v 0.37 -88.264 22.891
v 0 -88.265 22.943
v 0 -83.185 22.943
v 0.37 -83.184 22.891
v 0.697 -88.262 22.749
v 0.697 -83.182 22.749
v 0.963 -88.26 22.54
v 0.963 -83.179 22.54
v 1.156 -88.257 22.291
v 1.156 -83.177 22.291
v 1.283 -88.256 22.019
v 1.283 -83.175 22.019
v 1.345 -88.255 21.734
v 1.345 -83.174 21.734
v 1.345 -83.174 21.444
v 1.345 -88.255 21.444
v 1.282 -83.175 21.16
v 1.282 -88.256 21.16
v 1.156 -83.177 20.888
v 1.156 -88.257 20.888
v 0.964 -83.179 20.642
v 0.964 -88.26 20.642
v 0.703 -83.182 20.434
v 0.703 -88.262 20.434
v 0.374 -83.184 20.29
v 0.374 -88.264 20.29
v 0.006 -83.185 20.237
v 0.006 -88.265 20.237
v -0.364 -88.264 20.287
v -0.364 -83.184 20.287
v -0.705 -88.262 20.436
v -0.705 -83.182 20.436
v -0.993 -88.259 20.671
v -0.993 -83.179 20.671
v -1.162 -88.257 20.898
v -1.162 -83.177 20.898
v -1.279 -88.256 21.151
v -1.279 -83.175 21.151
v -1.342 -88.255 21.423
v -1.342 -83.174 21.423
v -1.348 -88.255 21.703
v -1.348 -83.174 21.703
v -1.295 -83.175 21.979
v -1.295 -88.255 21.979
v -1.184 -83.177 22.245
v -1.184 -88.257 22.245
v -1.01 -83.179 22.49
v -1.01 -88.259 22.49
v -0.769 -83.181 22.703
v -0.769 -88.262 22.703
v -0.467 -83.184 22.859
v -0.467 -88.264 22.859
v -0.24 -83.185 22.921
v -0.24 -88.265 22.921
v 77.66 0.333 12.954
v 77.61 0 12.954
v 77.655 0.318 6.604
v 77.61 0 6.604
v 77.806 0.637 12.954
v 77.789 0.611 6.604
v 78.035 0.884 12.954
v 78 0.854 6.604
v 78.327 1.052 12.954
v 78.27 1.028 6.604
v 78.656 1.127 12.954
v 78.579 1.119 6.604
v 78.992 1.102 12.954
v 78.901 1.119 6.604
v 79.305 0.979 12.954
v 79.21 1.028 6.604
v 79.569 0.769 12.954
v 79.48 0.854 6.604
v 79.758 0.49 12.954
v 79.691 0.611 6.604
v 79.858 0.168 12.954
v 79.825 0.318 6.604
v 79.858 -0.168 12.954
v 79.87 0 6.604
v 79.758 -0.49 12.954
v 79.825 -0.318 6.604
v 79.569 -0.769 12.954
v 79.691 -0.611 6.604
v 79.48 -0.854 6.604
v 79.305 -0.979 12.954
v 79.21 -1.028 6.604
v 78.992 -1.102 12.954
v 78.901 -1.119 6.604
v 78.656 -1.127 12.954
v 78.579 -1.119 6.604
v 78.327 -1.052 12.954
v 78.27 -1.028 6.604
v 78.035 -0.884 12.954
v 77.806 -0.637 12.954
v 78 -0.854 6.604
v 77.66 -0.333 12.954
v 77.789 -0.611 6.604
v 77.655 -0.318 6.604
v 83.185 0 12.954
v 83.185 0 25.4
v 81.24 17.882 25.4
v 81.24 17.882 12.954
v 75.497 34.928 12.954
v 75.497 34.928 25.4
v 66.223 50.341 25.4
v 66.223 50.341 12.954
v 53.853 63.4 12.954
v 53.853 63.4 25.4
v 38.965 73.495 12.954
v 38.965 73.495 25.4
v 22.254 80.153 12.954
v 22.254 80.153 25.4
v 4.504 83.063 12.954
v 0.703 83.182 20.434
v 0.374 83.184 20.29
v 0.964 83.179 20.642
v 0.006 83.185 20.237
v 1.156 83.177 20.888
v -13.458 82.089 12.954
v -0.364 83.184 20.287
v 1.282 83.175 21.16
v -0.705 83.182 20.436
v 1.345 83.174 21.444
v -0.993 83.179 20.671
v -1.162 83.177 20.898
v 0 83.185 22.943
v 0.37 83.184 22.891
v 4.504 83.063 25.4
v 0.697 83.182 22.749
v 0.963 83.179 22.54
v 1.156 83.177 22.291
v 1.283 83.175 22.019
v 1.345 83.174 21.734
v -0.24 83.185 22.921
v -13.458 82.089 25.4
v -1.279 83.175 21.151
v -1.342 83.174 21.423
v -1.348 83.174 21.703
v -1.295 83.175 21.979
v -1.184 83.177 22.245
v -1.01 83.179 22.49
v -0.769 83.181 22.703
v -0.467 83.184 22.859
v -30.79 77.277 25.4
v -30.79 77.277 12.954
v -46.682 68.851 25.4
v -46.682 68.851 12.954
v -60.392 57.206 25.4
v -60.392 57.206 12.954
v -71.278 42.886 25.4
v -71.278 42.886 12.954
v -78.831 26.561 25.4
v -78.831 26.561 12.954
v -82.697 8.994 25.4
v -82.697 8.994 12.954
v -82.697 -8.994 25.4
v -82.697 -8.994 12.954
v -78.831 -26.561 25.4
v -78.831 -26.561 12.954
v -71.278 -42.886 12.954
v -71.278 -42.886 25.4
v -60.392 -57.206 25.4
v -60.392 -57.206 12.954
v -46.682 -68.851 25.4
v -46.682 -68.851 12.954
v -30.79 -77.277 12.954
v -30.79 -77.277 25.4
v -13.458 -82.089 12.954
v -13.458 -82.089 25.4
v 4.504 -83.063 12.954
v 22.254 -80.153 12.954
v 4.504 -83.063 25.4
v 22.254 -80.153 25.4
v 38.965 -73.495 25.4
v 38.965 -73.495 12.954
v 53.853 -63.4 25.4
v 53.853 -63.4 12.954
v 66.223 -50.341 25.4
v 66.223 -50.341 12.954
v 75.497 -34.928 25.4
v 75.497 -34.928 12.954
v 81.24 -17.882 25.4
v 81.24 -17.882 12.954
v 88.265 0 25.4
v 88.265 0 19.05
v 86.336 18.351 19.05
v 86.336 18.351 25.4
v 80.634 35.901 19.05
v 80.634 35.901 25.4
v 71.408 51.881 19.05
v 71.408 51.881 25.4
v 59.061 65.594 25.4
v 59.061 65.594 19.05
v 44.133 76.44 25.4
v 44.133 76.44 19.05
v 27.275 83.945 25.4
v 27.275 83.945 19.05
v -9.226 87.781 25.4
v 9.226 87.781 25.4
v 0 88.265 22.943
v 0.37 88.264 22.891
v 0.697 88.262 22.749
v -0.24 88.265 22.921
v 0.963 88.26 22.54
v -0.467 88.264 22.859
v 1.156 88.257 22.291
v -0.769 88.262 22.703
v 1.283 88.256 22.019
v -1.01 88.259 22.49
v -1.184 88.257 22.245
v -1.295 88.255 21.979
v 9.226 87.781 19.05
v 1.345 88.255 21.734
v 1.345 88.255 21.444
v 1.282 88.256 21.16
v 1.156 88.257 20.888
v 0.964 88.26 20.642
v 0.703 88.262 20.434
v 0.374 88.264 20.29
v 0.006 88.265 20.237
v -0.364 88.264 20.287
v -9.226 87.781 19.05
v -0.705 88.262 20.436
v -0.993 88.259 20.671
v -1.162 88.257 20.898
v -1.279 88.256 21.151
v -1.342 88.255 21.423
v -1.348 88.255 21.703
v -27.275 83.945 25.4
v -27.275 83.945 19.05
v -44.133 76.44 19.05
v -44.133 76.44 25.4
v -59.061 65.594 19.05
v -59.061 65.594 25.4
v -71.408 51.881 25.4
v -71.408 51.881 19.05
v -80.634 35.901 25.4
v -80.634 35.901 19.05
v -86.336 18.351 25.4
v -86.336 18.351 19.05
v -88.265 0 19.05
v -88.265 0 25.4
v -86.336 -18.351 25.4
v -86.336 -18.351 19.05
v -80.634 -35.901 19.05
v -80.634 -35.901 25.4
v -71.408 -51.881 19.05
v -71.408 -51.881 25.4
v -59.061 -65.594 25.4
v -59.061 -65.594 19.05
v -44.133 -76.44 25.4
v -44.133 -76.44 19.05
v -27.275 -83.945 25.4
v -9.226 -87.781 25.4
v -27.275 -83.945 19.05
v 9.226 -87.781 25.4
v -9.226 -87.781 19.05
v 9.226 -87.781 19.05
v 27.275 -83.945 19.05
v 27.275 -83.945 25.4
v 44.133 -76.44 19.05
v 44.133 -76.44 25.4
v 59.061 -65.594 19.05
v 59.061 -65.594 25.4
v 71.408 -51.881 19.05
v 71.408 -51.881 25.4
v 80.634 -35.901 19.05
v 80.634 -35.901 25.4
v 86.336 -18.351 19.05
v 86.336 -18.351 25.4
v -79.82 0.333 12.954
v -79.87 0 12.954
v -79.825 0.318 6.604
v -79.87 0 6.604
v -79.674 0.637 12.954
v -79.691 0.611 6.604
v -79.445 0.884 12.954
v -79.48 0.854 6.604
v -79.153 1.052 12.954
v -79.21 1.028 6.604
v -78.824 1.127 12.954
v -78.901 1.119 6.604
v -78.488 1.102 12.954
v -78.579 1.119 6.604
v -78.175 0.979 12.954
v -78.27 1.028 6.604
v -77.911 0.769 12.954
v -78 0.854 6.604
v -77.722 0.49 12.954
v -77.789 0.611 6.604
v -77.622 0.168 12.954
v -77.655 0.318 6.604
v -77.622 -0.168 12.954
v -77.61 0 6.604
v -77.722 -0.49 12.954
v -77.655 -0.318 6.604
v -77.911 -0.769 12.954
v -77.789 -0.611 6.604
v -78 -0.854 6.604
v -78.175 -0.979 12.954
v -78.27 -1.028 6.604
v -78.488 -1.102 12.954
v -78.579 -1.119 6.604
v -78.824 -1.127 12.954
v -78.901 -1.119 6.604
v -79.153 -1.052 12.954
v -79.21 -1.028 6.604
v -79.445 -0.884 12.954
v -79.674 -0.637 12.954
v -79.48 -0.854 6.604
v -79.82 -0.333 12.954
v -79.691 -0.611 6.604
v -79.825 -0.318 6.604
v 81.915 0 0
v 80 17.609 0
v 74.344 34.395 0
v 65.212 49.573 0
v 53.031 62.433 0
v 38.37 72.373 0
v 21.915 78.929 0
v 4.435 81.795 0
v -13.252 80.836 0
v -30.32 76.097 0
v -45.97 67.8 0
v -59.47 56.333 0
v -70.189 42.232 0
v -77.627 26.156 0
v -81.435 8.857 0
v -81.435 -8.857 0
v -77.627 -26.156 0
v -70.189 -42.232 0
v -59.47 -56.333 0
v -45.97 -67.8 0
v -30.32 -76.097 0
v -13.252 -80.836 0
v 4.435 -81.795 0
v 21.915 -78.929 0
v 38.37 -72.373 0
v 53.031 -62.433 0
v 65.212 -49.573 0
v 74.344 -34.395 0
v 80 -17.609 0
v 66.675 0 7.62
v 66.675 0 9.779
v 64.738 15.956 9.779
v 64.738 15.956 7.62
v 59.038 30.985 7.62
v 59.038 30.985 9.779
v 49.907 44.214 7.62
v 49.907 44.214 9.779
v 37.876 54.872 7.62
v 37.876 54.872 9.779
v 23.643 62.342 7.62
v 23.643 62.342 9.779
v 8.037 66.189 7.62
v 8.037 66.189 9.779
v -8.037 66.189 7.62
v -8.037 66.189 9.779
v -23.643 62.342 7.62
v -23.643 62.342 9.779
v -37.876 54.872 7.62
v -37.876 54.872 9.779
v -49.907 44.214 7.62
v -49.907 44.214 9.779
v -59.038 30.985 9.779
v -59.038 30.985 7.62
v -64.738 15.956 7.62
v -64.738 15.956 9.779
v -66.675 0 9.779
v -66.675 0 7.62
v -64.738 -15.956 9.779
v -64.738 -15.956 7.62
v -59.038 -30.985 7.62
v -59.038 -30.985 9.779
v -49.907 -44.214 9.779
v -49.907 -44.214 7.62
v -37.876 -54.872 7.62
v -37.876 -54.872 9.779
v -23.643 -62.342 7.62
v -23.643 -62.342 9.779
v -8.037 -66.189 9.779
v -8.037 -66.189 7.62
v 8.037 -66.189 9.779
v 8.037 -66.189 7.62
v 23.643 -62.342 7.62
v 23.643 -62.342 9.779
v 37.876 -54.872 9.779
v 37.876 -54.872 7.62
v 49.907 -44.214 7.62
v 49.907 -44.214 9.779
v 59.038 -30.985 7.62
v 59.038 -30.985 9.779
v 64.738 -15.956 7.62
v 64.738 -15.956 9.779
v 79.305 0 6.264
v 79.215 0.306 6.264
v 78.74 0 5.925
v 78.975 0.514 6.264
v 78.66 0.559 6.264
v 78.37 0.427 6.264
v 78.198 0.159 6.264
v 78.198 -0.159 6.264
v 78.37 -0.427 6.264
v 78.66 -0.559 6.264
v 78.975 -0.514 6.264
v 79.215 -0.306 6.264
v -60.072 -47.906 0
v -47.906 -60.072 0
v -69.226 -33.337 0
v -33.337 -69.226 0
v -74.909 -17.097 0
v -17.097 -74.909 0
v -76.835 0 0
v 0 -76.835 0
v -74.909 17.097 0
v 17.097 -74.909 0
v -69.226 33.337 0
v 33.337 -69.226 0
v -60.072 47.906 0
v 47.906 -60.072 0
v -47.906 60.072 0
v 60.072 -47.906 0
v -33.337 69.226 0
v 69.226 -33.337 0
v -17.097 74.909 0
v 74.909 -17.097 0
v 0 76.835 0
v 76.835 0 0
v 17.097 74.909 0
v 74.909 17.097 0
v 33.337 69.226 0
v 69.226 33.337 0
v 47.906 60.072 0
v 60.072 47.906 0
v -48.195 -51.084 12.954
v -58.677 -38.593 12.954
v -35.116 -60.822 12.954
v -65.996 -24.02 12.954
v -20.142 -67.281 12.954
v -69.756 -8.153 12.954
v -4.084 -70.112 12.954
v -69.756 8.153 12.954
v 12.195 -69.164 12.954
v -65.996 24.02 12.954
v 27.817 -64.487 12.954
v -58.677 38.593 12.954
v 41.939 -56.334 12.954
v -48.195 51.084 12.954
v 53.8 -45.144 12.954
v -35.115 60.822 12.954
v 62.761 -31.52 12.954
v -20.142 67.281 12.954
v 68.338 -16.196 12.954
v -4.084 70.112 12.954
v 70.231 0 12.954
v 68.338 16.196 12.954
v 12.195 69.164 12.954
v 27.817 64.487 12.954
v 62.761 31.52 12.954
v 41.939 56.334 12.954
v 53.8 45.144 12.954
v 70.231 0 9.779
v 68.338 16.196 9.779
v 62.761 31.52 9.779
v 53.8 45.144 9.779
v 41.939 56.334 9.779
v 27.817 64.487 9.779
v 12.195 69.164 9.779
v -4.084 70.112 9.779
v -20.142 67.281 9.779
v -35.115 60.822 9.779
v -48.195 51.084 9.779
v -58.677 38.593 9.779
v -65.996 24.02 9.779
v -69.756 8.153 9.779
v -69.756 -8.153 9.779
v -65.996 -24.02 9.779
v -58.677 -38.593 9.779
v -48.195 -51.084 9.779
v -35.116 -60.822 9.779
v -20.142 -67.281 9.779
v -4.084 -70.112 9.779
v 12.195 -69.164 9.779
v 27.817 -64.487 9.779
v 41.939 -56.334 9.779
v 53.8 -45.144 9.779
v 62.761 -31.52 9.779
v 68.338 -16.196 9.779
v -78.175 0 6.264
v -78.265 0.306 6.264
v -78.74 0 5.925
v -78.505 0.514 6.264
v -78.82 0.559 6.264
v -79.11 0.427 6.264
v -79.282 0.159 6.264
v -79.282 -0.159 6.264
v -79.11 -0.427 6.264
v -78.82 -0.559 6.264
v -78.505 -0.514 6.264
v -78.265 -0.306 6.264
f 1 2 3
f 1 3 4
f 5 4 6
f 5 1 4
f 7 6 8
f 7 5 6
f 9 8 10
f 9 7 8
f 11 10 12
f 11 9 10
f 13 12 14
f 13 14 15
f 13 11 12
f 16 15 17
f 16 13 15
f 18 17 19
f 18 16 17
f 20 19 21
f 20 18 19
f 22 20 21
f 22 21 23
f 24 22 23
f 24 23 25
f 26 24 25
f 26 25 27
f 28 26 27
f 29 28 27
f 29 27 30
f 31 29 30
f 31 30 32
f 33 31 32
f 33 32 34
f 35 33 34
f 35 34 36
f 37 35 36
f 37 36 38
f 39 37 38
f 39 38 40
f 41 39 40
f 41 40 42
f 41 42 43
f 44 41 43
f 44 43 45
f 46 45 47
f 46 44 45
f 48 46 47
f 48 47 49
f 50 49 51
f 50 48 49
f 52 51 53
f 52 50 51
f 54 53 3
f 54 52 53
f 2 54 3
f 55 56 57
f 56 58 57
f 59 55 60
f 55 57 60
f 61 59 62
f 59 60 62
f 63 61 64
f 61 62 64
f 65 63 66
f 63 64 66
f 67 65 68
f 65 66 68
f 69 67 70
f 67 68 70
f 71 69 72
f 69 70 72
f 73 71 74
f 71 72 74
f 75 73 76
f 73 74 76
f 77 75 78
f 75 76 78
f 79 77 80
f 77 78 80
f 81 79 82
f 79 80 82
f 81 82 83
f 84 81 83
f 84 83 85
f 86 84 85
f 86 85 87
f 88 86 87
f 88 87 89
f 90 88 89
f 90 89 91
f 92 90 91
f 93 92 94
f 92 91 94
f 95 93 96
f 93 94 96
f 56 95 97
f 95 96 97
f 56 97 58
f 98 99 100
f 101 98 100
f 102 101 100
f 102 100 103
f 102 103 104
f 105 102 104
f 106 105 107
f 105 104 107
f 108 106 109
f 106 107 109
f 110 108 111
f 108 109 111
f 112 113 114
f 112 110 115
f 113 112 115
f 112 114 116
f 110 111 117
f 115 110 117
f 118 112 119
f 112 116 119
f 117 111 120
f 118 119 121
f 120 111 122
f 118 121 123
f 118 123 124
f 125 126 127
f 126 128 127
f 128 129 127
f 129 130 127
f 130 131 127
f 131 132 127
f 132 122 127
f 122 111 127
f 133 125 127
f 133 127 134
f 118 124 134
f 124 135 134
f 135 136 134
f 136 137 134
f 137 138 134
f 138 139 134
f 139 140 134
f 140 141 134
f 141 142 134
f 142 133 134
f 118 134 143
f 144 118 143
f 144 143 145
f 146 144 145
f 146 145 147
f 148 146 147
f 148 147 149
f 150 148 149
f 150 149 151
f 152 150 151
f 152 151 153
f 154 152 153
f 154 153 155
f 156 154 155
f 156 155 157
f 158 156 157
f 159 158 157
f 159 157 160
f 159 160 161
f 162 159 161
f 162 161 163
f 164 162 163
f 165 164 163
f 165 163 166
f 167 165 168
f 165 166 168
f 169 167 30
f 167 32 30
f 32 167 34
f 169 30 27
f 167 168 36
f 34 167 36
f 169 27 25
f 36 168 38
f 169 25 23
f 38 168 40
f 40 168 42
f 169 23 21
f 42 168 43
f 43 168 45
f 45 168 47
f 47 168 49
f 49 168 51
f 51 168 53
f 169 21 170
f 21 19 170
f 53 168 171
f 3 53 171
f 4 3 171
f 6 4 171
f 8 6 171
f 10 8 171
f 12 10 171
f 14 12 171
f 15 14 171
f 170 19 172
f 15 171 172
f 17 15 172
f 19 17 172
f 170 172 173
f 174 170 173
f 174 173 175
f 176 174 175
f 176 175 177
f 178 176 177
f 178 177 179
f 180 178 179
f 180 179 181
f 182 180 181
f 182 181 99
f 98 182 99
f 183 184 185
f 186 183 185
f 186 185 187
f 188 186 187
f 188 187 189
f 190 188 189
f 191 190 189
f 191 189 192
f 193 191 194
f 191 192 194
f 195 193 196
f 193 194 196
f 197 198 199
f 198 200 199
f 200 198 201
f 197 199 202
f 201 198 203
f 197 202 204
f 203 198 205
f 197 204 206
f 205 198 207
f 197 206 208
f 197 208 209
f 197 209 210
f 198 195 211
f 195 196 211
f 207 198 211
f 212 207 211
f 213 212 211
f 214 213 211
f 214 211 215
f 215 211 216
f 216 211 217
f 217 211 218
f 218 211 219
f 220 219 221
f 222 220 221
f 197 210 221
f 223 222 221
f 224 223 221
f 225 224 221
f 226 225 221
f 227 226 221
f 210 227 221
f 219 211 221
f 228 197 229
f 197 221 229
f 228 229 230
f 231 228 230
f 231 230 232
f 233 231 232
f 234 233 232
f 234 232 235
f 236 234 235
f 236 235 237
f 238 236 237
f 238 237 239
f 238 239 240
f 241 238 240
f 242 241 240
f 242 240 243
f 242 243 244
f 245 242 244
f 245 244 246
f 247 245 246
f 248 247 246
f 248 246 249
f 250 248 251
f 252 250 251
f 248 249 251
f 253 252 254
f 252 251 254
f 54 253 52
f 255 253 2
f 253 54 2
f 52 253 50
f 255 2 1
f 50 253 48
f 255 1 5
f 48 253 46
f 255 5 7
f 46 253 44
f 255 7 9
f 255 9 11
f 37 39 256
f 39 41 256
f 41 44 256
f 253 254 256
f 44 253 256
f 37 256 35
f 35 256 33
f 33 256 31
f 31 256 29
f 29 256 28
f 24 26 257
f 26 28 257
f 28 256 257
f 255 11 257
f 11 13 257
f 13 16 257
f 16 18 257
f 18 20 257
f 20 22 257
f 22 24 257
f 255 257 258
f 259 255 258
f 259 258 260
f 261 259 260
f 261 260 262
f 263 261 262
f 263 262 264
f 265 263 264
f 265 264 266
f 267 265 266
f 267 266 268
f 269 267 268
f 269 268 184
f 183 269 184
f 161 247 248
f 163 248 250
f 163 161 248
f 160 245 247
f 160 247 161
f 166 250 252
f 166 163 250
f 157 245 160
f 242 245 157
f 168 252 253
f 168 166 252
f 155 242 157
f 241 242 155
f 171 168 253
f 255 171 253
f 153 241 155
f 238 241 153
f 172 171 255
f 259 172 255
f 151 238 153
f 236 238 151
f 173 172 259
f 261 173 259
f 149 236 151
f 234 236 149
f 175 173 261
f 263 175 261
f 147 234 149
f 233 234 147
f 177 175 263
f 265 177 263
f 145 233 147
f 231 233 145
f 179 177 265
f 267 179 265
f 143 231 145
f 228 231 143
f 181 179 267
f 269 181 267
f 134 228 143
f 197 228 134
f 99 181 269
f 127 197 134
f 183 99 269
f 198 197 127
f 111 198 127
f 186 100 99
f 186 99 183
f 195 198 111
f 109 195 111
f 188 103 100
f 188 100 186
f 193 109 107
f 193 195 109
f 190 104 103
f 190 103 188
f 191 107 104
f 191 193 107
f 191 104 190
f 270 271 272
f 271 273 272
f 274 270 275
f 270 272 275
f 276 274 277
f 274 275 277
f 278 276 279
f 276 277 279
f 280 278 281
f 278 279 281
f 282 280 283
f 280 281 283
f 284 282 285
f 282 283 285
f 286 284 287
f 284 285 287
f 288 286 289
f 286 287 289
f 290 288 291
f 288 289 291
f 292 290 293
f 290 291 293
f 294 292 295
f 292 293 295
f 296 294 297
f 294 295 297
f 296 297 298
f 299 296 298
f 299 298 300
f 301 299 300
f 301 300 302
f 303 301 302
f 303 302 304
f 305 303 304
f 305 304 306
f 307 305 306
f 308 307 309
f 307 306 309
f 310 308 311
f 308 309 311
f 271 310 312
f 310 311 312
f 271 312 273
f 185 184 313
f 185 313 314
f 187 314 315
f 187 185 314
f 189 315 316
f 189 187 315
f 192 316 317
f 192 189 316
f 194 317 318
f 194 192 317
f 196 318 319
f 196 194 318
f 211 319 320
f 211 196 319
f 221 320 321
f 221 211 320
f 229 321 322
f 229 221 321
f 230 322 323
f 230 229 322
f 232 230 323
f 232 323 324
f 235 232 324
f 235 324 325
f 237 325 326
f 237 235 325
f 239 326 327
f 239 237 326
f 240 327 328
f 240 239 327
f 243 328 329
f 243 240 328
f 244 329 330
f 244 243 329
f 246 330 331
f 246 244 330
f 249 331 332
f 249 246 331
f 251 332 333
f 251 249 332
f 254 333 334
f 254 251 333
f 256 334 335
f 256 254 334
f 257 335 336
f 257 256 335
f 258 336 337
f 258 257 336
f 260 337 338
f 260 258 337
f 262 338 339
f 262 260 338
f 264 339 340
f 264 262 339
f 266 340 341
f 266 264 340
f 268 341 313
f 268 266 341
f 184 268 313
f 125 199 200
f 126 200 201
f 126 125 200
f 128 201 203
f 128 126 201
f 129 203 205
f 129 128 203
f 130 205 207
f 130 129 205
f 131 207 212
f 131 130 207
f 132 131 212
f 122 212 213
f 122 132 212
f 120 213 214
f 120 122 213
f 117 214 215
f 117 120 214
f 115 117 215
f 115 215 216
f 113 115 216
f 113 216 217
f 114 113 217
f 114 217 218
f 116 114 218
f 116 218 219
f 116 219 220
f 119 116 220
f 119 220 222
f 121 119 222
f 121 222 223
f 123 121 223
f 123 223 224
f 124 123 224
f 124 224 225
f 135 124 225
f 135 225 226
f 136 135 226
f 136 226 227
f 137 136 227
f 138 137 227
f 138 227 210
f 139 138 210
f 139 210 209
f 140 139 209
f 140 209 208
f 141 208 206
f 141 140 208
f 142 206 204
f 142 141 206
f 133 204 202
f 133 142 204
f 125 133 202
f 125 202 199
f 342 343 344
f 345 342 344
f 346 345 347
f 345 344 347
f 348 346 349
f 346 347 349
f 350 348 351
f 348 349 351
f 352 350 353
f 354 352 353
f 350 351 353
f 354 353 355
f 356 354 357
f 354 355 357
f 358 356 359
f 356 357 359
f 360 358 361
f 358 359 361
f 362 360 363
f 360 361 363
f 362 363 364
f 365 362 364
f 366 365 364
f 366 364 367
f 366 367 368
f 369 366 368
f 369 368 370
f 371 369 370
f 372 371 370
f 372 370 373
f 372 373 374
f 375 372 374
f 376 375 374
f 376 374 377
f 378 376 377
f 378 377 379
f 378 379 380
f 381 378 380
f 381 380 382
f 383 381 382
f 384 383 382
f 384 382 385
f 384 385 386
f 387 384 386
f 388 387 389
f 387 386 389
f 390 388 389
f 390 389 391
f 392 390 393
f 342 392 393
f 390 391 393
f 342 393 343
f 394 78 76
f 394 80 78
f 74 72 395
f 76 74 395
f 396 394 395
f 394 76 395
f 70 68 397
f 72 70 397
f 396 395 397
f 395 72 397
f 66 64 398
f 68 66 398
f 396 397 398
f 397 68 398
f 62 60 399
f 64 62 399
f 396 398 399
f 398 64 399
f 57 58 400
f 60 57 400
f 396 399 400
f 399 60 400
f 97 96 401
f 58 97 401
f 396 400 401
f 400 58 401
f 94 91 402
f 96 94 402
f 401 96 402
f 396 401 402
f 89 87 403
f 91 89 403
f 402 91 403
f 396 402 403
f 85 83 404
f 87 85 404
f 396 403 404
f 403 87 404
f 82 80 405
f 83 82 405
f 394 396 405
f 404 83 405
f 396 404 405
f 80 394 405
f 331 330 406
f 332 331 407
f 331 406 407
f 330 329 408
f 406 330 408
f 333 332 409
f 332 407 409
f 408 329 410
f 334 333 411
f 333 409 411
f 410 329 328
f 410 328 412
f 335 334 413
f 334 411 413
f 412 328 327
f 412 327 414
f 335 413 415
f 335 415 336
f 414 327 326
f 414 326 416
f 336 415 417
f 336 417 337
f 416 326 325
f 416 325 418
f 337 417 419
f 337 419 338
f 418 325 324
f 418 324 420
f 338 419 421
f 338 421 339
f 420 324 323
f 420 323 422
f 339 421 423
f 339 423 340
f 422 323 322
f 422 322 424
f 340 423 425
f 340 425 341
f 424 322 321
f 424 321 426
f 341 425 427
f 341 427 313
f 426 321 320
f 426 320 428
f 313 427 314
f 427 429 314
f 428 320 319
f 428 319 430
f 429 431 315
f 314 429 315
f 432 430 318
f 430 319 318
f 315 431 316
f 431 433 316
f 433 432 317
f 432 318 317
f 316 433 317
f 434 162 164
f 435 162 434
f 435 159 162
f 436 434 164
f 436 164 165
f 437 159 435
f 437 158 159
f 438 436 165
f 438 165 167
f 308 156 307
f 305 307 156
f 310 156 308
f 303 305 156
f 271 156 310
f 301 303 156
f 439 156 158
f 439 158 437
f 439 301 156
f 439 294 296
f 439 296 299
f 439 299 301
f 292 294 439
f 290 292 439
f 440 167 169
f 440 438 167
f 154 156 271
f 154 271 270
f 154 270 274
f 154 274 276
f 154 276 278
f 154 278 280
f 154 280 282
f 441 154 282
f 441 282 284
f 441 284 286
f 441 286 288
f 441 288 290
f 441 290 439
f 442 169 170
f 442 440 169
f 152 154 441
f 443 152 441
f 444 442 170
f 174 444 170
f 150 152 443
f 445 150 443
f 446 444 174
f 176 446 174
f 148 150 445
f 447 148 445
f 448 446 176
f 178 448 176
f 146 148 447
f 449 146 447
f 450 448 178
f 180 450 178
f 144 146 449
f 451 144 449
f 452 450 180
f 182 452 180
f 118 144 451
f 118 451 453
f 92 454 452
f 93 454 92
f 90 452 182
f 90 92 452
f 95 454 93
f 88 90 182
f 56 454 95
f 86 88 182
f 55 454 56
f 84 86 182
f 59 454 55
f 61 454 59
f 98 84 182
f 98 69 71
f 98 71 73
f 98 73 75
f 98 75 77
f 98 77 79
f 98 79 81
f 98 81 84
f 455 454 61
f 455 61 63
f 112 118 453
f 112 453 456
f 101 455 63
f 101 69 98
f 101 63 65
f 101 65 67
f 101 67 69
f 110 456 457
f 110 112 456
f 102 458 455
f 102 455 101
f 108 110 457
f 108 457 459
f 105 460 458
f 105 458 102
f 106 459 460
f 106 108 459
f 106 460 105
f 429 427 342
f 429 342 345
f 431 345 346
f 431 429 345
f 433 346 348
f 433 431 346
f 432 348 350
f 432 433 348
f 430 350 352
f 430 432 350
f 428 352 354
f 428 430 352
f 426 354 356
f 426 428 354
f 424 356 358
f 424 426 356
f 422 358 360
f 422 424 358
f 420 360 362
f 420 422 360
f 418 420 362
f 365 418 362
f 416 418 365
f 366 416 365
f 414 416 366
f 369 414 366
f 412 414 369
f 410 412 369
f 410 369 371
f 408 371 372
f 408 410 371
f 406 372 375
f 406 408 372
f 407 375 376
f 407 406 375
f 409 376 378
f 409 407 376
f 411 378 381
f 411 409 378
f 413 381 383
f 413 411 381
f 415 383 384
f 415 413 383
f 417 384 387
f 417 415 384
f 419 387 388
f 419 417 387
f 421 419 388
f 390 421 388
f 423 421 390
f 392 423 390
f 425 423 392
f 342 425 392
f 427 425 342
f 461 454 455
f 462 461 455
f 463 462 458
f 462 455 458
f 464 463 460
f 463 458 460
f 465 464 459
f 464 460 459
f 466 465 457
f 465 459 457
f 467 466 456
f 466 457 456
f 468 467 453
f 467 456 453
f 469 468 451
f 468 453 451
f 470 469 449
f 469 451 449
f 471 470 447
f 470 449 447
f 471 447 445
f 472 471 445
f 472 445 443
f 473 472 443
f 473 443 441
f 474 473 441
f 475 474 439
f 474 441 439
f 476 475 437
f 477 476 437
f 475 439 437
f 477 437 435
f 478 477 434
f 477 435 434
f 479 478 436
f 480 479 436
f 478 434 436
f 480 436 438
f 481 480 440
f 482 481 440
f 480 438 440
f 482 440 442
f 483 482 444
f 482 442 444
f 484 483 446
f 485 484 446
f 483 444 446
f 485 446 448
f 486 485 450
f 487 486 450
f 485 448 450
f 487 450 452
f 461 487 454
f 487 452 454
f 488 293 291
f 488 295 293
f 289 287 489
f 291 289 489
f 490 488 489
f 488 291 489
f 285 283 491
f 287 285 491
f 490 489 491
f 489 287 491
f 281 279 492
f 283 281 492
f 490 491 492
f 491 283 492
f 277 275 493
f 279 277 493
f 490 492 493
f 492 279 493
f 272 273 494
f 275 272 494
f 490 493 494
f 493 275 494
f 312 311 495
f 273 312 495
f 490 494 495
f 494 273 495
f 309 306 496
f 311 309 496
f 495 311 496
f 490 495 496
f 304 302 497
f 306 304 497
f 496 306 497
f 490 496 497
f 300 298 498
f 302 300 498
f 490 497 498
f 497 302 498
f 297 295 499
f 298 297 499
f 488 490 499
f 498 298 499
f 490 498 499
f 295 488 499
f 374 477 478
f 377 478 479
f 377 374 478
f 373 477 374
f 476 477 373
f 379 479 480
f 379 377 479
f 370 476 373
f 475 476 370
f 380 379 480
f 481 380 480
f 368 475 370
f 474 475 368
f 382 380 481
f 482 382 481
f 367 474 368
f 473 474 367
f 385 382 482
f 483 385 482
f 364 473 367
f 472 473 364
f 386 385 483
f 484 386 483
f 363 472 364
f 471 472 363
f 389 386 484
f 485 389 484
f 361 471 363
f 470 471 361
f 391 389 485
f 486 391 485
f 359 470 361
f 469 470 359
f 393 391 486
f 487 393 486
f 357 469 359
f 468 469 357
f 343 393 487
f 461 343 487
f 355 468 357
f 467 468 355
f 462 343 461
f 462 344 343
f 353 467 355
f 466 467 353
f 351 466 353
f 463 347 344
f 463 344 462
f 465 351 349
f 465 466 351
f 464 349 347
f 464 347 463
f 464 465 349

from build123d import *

# Parameters (mm, degrees)
SKETCH1_R                     = 88.265
BOSS_EXTRUDE1_DEPTH           = 25.4
SKETCH2_R                     = 83.185
CUT_EXTRUDE1_DEPTH            = 9.144
SKETCH3_R                     = 76.2
CUT_EXTRUDE2_DEPTH            = 3.302
SKETCH4_R                     = 70.231
CUT_EXTRUDE3_DEPTH            = 3.175
SKETCH6_R                     = 66.675
CUT_EXTRUDE5_DEPTH            = 126.799189548
SKETCH7_R                     = 83.185
CUT_EXTRUDE6_DEPTH            = 3.302
CHAMFER2_SIZE                 = 6.35
CHAMFER2_SIZE2                = 19.05
CHAMFER1_SIZE                 = 7.62
CHAMFER1_SIZE2                = 10.16
CUT_EXTRUDE4_DEPTH            = 128.383595686
CUT_EXTRUDE4_DEPTH_BACK       = 128.383595686
SKETCH5_R                     = 1.35255
TAP_DRILL_FOR_4_40_TAP1_D     = 2.2606
TAP_DRILL_FOR_4_40_TAP1_DEPTH = 6.35
TAP_DRILL_FOR_4_40_TAP1_TIP   = 0.679152758


with BuildPart() as part:
    # Sketch1 → Boss-Extrude1 (new body)
    with BuildSketch(Plane.XY):
        Circle(SKETCH1_R)
    extrude(amount=BOSS_EXTRUDE1_DEPTH)

    # Sketch2 → Cut-Extrude1 (cut)
    with BuildSketch(Plane.XY.offset(25.4)):
        Circle(SKETCH2_R)
    extrude(amount=-CUT_EXTRUDE1_DEPTH, mode=Mode.SUBTRACT)

    # Sketch3 → Cut-Extrude2 (cut)
    with BuildSketch(Plane.XY.offset(16.256)):
        Circle(SKETCH3_R)
    extrude(amount=-CUT_EXTRUDE2_DEPTH, mode=Mode.SUBTRACT)

    # Sketch4 → Cut-Extrude3 (cut)
    with BuildSketch(Plane.XY.offset(12.954)):
        Circle(SKETCH4_R)
    extrude(amount=-CUT_EXTRUDE3_DEPTH, mode=Mode.SUBTRACT)

    # Sketch6 → Cut-Extrude5 (cut, through all)
    with BuildSketch(Plane.XY.offset(9.779)):
        Circle(SKETCH6_R)
    extrude(amount=-CUT_EXTRUDE5_DEPTH, mode=Mode.SUBTRACT)

    # Sketch7 → Cut-Extrude6 (cut)
    with BuildSketch(Plane.XY.offset(16.256)):
        Circle(SKETCH7_R)
    extrude(amount=-CUT_EXTRUDE6_DEPTH, mode=Mode.SUBTRACT)

    # Chamfer2
    chamfer2_edges = [part.edges().sort_by_distance(p)[0] for p in [
        (-88.265, 0, 0),
    ]]
    chamfer2_side = [part.faces().sort_by_distance(p)[0] for p in [
        (-85.768488798, 0, 0),
    ]]
    chamfer(chamfer2_edges, length=CHAMFER2_SIZE, length2=CHAMFER2_SIZE2, reference=chamfer2_side[0])

    # Chamfer1
    chamfer1_edges = [part.edges().sort_by_distance(p)[0] for p in [
        (-66.675, 0, 0),
    ]]
    chamfer1_side = [part.faces().sort_by_distance(p)[0] for p in [
        (-66.675, 0, 4.8895),
    ]]
    chamfer(chamfer1_edges, length=CHAMFER1_SIZE, length2=CHAMFER1_SIZE2, reference=chamfer1_side[0])

    # Sketch5 → Cut-Extrude4 (cut, two sides: drawn at the far end of the back side and taken through both)
    with BuildSketch(Plane(origin=(0, 0, 0), x_dir=(1, 0, 0), z_dir=(0, 1, 0)).offset(-CUT_EXTRUDE4_DEPTH_BACK)):
        with Locations(Location((0, -21.59, 0), (0, 0, 270))):
            Circle(SKETCH5_R)
    extrude(amount=CUT_EXTRUDE4_DEPTH + CUT_EXTRUDE4_DEPTH_BACK, mode=Mode.SUBTRACT)

    # Tap Drill for #4-40 Tap1
    with Locations(Plane.XY.offset(12.954)):
        with Locations((-78.74, 0), (78.74, 0)):
            Hole(TAP_DRILL_FOR_4_40_TAP1_D / 2, depth=TAP_DRILL_FOR_4_40_TAP1_DEPTH)
            with Locations((0, 0, -(TAP_DRILL_FOR_4_40_TAP1_DEPTH + TAP_DRILL_FOR_4_40_TAP1_TIP / 2))):  # 118° drill point
                Cone(0, TAP_DRILL_FOR_4_40_TAP1_D / 2, TAP_DRILL_FOR_4_40_TAP1_TIP, mode=Mode.SUBTRACT)


solid = part.part
